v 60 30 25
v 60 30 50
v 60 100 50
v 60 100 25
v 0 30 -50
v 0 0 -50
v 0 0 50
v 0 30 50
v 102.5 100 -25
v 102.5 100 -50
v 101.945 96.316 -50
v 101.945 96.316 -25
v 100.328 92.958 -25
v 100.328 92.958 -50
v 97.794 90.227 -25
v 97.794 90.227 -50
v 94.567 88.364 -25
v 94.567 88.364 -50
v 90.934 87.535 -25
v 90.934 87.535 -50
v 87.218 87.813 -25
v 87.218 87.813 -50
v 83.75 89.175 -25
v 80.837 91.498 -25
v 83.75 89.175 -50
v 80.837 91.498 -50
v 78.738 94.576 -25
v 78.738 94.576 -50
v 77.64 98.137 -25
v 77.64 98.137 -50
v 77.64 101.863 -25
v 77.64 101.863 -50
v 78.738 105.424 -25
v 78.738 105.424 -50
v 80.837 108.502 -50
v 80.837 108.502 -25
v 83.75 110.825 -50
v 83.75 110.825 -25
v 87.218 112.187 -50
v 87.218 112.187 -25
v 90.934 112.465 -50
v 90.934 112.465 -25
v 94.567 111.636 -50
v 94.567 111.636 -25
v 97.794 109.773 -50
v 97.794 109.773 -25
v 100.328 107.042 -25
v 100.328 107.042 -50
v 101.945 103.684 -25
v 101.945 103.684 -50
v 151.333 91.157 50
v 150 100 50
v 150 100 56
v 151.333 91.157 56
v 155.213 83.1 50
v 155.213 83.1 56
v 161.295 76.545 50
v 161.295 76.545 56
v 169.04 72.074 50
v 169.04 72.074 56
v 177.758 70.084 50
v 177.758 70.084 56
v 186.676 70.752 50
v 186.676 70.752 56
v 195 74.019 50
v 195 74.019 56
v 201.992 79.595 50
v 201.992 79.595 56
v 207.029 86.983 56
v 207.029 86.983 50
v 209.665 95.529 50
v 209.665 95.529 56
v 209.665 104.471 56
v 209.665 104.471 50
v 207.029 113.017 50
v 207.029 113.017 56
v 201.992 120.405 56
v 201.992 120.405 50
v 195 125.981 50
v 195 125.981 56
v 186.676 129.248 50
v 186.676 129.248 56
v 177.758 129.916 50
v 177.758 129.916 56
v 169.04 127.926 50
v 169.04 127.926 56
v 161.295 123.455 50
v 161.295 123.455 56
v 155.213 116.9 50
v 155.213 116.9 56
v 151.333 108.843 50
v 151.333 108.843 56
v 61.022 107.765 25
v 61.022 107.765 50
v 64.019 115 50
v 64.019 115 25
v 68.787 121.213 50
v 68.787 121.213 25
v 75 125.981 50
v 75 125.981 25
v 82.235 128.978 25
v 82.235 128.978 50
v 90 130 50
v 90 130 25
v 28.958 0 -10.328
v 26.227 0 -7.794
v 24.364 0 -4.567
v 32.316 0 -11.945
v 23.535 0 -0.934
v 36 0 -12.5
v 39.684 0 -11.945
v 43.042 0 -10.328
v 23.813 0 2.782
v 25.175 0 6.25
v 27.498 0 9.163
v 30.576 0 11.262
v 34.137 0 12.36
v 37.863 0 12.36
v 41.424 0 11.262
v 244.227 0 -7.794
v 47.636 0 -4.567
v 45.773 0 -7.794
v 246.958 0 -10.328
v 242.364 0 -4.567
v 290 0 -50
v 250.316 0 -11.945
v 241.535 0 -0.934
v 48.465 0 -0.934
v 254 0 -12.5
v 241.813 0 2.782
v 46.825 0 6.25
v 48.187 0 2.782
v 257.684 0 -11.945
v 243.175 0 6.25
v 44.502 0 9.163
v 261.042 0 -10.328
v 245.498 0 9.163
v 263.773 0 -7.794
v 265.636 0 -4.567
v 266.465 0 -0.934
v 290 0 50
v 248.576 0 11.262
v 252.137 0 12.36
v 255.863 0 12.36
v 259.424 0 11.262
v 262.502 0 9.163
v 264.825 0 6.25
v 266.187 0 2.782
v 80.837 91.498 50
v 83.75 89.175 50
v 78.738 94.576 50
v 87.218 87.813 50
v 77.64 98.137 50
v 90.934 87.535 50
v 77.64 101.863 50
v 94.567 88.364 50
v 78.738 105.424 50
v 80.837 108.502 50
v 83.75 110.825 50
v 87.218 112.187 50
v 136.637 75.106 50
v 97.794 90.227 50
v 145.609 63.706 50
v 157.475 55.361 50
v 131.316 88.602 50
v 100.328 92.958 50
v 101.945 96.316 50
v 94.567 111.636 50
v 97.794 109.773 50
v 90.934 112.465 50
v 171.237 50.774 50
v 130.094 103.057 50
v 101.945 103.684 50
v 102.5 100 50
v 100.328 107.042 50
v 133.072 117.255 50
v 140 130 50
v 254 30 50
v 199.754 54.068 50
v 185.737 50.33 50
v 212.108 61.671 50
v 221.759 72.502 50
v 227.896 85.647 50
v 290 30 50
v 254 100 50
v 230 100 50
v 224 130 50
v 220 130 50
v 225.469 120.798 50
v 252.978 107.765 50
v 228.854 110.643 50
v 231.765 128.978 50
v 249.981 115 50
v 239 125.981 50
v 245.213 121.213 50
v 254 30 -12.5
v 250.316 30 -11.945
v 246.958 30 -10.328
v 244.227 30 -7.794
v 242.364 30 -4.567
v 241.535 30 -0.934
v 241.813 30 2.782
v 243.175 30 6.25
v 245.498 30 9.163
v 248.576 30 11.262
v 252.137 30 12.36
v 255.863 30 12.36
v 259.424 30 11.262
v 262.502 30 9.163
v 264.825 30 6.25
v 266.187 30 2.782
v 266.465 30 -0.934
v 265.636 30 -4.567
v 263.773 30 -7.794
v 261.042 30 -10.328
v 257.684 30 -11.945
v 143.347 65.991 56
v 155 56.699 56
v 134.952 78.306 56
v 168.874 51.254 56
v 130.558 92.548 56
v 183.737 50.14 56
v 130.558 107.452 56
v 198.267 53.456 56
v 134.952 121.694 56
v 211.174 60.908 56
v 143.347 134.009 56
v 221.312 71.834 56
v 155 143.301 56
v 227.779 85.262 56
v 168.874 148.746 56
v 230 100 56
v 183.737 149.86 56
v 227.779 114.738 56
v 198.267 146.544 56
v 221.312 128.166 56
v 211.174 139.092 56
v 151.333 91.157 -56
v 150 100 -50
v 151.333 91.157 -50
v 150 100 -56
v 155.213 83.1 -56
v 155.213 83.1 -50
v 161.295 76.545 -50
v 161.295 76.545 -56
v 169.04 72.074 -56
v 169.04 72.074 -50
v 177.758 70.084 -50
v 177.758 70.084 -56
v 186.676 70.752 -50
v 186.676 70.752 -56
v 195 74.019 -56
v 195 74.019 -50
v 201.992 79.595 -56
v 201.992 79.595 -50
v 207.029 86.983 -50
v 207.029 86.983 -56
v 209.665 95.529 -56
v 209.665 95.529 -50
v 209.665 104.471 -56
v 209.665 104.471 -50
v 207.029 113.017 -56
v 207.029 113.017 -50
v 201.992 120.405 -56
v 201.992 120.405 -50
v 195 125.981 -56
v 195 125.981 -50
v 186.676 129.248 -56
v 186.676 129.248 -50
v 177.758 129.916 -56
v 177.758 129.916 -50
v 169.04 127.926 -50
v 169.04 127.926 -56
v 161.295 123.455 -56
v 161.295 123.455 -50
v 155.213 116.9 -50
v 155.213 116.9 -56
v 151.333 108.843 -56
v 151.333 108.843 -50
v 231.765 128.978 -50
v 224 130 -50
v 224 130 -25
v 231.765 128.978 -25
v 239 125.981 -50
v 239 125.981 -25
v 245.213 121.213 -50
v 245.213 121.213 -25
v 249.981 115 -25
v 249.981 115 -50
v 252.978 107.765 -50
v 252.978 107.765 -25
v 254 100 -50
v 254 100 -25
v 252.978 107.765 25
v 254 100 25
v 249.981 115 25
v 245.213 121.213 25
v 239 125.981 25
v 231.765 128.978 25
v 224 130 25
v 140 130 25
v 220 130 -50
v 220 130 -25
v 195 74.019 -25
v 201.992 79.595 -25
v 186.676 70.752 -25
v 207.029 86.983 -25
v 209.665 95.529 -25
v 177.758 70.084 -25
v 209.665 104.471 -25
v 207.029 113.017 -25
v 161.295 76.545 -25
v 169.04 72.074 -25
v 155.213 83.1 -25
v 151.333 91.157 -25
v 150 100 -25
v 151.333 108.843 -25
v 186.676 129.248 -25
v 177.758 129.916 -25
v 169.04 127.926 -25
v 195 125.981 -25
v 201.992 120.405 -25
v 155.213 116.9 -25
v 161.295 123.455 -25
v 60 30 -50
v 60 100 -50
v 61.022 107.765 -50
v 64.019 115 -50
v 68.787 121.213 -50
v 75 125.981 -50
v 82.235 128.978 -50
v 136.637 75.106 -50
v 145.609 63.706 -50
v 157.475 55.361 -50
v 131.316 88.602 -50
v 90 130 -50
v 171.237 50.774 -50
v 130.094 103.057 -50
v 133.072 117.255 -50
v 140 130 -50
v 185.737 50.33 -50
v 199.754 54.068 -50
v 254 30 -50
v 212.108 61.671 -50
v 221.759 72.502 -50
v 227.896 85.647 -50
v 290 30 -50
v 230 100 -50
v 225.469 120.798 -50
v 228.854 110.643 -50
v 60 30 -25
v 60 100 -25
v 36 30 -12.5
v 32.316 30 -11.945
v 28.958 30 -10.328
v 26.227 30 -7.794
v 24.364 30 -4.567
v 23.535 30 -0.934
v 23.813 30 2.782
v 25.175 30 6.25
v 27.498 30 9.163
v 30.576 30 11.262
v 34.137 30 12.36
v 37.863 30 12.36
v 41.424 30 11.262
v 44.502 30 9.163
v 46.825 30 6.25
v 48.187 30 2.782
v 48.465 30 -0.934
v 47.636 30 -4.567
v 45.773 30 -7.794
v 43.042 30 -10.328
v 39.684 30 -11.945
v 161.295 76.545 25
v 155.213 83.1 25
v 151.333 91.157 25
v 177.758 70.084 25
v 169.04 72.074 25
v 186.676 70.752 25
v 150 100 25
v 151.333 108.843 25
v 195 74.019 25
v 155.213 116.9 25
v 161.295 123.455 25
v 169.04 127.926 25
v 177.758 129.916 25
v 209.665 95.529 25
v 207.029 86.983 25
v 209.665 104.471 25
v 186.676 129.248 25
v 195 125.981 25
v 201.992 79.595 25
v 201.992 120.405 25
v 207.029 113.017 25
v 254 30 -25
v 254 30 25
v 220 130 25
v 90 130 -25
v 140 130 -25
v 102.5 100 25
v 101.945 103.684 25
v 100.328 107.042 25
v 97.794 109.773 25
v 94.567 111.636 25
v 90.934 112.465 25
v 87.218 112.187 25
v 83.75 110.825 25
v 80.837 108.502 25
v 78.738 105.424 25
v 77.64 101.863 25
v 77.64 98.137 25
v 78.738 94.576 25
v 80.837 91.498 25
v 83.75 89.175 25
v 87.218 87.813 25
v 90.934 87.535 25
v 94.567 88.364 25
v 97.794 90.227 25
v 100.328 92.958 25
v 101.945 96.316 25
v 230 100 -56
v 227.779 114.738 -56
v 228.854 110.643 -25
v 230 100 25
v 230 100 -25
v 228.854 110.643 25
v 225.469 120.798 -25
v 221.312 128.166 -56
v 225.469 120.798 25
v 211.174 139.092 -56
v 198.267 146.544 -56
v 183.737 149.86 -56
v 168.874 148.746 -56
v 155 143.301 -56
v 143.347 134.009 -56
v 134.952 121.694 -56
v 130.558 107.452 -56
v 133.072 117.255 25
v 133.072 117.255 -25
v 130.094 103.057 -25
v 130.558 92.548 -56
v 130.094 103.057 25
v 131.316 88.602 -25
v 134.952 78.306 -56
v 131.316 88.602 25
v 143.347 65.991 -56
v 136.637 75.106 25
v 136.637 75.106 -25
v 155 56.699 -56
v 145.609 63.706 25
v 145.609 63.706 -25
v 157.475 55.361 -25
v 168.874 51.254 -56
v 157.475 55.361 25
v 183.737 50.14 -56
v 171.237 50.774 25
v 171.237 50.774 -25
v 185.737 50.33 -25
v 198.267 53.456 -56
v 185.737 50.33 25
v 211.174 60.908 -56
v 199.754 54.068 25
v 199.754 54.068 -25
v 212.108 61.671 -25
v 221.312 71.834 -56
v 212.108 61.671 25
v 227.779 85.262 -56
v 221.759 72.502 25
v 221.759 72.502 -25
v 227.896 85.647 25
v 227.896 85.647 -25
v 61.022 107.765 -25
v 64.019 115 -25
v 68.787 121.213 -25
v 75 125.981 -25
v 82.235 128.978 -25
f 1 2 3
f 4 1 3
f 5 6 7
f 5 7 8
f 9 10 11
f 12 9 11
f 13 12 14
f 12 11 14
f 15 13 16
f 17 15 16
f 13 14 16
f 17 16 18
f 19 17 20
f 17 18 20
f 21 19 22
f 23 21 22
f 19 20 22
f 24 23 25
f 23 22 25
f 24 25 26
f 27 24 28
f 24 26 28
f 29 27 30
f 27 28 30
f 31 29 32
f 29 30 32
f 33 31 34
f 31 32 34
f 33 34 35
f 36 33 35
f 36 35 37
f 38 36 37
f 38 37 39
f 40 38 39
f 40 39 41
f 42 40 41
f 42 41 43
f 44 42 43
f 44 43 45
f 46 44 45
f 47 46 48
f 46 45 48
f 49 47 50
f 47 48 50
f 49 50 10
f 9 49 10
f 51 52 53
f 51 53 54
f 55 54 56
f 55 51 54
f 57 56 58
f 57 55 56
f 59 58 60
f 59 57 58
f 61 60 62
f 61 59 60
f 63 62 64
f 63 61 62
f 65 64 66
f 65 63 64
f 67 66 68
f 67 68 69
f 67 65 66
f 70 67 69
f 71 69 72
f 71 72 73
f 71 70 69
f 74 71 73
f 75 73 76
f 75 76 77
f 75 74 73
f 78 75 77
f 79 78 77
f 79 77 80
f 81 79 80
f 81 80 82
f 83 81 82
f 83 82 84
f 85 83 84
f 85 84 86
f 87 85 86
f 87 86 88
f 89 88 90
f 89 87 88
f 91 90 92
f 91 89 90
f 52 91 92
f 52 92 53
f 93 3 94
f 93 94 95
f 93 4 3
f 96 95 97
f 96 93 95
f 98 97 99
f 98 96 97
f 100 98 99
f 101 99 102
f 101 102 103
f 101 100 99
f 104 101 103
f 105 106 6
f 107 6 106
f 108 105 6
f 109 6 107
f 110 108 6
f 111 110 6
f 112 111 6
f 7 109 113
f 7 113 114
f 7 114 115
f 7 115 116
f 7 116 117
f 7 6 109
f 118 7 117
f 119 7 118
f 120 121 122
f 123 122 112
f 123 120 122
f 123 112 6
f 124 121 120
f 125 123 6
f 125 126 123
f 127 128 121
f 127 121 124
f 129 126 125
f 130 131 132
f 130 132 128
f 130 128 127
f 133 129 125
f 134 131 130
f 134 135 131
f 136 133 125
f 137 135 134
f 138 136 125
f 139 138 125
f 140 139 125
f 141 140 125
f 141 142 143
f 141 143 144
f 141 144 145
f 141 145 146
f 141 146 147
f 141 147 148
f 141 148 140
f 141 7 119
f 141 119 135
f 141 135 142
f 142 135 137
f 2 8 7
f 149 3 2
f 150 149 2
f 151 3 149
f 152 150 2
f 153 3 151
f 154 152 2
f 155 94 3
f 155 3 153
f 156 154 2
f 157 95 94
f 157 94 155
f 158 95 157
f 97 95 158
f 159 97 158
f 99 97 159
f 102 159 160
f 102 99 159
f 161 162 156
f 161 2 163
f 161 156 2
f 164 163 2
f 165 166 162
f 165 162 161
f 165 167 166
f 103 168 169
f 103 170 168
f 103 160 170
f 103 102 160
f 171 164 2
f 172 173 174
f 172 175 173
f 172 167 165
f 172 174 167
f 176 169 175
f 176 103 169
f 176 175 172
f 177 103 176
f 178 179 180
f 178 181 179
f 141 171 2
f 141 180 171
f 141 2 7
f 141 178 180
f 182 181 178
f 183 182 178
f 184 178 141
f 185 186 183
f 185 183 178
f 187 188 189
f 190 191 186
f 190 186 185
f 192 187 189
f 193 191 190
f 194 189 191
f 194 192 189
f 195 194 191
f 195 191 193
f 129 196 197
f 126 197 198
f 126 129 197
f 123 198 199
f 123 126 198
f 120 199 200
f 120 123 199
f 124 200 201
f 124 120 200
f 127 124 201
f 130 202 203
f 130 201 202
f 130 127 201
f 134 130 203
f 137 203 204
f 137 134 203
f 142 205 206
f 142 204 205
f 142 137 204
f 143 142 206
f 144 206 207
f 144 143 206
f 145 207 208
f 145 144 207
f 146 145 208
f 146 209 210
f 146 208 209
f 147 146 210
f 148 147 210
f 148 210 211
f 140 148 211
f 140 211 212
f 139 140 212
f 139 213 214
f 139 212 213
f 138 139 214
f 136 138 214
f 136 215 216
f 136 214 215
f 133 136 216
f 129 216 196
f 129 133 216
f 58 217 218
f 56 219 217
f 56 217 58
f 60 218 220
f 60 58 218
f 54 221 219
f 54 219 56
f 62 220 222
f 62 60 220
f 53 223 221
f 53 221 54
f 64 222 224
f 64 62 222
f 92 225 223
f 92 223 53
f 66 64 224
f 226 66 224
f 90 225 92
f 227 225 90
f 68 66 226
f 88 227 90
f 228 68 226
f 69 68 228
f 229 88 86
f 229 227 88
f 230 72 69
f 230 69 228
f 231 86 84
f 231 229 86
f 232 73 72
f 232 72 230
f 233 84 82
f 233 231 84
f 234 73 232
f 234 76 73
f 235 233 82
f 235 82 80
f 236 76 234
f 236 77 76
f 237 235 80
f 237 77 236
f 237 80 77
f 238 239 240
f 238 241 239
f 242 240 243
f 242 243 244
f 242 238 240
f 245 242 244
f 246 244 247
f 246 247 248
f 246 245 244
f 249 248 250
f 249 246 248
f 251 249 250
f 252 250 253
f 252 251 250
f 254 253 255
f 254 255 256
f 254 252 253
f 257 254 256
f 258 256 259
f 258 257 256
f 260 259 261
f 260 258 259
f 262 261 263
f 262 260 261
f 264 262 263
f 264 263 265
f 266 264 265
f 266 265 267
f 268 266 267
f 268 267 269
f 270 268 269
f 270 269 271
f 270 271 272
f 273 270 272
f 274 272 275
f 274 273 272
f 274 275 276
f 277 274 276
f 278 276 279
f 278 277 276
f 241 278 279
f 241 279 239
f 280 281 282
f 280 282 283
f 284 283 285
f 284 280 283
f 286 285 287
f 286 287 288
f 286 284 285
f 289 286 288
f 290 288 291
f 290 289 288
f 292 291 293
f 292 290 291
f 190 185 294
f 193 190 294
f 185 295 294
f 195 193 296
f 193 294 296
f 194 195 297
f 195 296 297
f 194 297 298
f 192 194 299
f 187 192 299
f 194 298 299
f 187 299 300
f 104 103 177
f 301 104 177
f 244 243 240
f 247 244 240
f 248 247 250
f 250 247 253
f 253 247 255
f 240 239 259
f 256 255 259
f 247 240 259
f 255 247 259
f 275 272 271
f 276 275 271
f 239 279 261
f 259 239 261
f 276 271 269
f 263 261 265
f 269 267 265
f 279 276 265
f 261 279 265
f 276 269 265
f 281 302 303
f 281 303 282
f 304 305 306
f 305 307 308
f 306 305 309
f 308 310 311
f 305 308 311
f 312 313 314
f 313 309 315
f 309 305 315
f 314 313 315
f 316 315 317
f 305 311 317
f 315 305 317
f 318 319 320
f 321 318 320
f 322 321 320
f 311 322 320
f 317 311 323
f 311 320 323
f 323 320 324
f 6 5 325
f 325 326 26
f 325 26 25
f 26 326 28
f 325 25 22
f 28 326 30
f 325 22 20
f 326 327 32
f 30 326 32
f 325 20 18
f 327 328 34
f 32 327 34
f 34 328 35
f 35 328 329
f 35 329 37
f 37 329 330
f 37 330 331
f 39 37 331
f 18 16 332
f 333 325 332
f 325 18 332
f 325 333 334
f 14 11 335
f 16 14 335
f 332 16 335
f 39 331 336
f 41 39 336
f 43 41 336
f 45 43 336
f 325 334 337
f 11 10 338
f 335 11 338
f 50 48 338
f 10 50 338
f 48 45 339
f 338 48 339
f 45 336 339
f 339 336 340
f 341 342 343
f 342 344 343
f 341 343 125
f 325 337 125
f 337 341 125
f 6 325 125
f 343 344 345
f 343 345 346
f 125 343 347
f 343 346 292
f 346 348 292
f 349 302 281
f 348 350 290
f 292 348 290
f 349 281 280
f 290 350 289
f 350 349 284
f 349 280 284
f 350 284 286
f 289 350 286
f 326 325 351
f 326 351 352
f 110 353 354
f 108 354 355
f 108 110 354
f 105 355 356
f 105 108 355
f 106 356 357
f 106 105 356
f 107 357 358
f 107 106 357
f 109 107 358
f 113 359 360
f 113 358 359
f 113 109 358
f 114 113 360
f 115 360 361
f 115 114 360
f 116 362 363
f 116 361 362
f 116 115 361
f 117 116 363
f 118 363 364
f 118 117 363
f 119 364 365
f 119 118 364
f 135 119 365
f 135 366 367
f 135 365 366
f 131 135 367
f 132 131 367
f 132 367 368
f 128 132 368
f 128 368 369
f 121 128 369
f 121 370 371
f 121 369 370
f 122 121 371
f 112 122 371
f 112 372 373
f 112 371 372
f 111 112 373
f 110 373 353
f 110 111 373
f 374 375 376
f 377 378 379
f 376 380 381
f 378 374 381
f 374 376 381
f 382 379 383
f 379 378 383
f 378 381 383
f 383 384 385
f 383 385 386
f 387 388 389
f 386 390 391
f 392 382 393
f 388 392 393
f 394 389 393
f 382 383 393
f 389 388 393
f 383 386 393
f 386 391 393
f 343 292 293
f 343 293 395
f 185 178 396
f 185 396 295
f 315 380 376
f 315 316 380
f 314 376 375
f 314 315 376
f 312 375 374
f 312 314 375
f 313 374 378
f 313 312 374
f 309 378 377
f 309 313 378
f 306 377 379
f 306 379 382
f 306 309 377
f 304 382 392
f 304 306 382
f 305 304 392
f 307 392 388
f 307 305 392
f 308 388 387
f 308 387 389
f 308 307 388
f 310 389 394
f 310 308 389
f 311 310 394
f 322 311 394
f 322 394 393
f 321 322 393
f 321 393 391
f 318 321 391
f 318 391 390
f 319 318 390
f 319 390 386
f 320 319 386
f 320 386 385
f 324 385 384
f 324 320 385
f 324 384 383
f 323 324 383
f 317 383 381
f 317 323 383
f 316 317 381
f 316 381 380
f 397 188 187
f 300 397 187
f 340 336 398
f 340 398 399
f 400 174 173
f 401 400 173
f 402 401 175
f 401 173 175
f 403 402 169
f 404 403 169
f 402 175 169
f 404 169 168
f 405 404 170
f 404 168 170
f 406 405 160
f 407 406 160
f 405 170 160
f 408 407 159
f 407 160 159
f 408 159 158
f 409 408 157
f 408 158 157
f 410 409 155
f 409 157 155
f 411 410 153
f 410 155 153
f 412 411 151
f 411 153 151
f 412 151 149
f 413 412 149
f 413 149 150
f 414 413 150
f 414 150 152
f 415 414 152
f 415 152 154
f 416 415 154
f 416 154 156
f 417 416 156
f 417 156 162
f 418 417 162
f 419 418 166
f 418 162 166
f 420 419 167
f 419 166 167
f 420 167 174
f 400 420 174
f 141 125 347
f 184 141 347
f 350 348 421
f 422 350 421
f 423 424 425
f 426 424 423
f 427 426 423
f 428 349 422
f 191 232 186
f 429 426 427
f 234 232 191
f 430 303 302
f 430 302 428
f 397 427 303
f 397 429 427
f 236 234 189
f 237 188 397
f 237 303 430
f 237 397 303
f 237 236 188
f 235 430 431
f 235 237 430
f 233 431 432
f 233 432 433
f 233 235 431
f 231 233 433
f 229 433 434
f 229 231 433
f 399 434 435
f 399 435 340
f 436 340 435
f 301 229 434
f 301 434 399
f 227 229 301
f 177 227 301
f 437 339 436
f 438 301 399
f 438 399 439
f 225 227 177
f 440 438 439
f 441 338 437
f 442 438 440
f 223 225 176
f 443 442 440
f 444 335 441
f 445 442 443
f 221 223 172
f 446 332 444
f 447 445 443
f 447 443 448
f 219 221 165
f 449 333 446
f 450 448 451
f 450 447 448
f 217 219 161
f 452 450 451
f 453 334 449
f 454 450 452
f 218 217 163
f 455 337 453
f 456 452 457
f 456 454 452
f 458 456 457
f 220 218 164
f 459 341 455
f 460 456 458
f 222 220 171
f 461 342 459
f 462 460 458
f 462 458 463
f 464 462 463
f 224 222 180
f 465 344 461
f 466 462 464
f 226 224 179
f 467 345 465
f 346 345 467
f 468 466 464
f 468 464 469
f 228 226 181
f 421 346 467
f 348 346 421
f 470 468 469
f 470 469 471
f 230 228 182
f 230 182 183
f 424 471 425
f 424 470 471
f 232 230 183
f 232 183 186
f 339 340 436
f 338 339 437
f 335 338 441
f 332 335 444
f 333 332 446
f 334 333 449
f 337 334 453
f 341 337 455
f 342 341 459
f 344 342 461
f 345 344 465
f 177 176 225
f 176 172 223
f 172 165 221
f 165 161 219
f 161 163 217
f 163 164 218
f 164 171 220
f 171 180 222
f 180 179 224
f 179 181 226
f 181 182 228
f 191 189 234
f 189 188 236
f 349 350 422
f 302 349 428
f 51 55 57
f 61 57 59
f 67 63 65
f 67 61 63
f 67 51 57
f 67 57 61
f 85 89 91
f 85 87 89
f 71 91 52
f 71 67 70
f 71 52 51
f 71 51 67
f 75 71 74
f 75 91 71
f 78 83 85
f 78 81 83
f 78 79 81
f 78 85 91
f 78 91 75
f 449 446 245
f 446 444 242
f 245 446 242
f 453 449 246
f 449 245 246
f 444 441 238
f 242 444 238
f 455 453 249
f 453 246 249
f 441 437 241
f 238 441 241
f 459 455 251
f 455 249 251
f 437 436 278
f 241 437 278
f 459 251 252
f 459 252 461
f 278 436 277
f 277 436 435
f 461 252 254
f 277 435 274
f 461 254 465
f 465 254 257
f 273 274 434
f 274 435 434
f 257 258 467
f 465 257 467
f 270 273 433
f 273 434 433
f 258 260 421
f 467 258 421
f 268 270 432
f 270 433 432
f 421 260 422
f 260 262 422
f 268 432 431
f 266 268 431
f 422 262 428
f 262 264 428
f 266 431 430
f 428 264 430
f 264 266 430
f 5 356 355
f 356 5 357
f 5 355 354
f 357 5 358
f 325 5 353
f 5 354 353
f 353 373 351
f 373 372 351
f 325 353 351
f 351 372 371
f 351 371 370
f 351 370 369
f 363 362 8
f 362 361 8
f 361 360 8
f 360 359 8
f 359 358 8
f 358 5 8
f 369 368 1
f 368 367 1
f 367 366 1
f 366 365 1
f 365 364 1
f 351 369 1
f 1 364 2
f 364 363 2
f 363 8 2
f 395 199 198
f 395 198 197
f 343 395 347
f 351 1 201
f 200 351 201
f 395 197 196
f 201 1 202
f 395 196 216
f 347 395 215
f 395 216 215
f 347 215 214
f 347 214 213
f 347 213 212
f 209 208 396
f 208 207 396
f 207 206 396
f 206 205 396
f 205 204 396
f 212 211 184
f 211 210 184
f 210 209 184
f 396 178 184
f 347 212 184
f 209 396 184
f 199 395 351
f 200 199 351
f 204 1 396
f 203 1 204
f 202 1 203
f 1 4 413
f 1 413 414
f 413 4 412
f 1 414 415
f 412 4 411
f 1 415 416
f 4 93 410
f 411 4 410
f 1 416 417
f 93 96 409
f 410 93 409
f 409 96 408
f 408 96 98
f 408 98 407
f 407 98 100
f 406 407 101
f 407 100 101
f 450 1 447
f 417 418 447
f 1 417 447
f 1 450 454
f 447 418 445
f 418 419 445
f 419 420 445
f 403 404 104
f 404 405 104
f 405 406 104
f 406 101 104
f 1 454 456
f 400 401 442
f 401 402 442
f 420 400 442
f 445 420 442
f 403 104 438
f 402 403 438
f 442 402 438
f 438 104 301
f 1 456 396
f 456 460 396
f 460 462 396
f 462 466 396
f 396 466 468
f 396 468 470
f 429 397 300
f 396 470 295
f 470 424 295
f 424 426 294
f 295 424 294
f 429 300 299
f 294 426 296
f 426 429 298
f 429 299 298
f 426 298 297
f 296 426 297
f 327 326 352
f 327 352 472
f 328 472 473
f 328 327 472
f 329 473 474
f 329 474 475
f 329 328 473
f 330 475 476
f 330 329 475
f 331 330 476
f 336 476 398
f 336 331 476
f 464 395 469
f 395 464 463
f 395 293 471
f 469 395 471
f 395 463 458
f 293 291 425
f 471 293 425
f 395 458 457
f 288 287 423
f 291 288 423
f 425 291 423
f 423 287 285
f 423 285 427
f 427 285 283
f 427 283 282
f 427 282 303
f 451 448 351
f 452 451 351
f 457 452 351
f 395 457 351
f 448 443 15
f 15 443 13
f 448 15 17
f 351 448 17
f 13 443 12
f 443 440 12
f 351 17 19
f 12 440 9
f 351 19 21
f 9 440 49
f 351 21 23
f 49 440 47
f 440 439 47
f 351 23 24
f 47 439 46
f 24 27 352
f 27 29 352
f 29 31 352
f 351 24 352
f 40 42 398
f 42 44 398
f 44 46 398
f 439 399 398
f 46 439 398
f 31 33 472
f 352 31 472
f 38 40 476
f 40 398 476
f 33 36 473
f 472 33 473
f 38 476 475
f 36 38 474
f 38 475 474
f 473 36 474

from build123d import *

# Parameters (mm, degrees)
SKETCH1_W           = 290
SKETCH1_H           = 30
BOSS_EXTRUDE1_DEPTH = 50
CUT_EXTRUDE3_REACH  = 32
SKETCH5_R           = 12.5
SKETCH7_W           = 194
SKETCH7_H           = 100
SKETCH7_R           = 12.5
BOSS_EXTRUDE2_DEPTH = 25
FILLET1_R           = 30
SKETCH8_R           = 12.5
BOSS_EXTRUDE3_DEPTH = 25
SKETCH9_R           = 50
SKETCH9_R_2         = 30
BOSS_EXTRUDE4_DEPTH = 56


with BuildPart() as part:
    # Sketch1 → Boss-Extrude1 (new body, symmetric)
    with BuildSketch(Plane.XY):
        with Locations((145, 15)):
            Rectangle(SKETCH1_W, SKETCH1_H)
    extrude(amount=BOSS_EXTRUDE1_DEPTH, both=True)

    # Sketch5 → Cut-Extrude3 (cut, up to next)
    with BuildSketch(Plane(origin=(0, 0, 0), x_dir=(1, 0, 0), z_dir=(0, 1, 0)), mode=Mode.PRIVATE) as cut_extrude3_sk1:
        with Locations(Location((36, 0, 0), (0, 0, 90))):  # turned: the seam where the file's is
            Circle(SKETCH5_R)
    cut_extrude3_tool1 = extrude(cut_extrude3_sk1.sketch, amount=CUT_EXTRUDE3_REACH, mode=Mode.PRIVATE) & part.part
    add(cut_extrude3_tool1.solids().sort_by_distance((36, 0, 0))[0], mode=Mode.SUBTRACT)
    # Sketch5 → Cut-Extrude3 (cut, up to next)
    with BuildSketch(Plane(origin=(0, 0, 0), x_dir=(1, 0, 0), z_dir=(0, 1, 0)), mode=Mode.PRIVATE) as cut_extrude3_sk2:
        with Locations(Location((254, 0, 0), (0, 0, 90))):  # turned: the seam where the file's is
            Circle(SKETCH5_R)
    cut_extrude3_tool2 = extrude(cut_extrude3_sk2.sketch, amount=CUT_EXTRUDE3_REACH, mode=Mode.PRIVATE) & part.part
    add(cut_extrude3_tool2.solids().sort_by_distance((254, 0, 0))[0], mode=Mode.SUBTRACT)

    # Sketch7 → Boss-Extrude2 (add)
    with BuildSketch(Plane.XY.offset(50)):
        with Locations((157, 80)):
            Rectangle(SKETCH7_W, SKETCH7_H)
        with Locations((90, 100)):
            Circle(SKETCH7_R, mode=Mode.SUBTRACT)
    extrude(amount=-BOSS_EXTRUDE2_DEPTH)

    # Fillet1
    fillet1_edges = [part.edges().sort_by_distance(p)[0] for p in [
        (254, 130, 37.5),
        (60, 130, 37.5),
    ]]
    fillet(fillet1_edges, radius=FILLET1_R)

    # Sketch8 → Boss-Extrude3 (add)
    with BuildSketch(Plane(origin=(0, 0, -50), x_dir=(-1, 0, 0), z_dir=(0, 0, -1))):
        with BuildLine():
            Line((-90, 130), (-224, 130))
            ThreePointArc((-224, 130), (-245.213203436, 121.213203436), (-254, 100))
            Line((-254, 100), (-254, 30))
            Line((-254, 30), (-60, 30))
            Line((-60, 30), (-60, 100))
            ThreePointArc((-60, 100), (-68.786796564, 121.213203436), (-90, 130))
        make_face()
        with Locations(Location((-90, 100, 0), (0, 0, 180))):  # turned: the seam where the file's is
            Circle(SKETCH8_R, mode=Mode.SUBTRACT)
    extrude(amount=-BOSS_EXTRUDE3_DEPTH)

    # Sketch9 → Boss-Extrude4 (add, symmetric)
    with BuildSketch(Plane.XY):
        with Locations((180, 100)):
            Circle(SKETCH9_R)
        with Locations(Location((180, 100, 0), (0, 0, 180))):  # turned: the seam where the file's is
            Circle(SKETCH9_R_2, mode=Mode.SUBTRACT)
    extrude(amount=BOSS_EXTRUDE4_DEPTH, both=True)


solid = part.part
